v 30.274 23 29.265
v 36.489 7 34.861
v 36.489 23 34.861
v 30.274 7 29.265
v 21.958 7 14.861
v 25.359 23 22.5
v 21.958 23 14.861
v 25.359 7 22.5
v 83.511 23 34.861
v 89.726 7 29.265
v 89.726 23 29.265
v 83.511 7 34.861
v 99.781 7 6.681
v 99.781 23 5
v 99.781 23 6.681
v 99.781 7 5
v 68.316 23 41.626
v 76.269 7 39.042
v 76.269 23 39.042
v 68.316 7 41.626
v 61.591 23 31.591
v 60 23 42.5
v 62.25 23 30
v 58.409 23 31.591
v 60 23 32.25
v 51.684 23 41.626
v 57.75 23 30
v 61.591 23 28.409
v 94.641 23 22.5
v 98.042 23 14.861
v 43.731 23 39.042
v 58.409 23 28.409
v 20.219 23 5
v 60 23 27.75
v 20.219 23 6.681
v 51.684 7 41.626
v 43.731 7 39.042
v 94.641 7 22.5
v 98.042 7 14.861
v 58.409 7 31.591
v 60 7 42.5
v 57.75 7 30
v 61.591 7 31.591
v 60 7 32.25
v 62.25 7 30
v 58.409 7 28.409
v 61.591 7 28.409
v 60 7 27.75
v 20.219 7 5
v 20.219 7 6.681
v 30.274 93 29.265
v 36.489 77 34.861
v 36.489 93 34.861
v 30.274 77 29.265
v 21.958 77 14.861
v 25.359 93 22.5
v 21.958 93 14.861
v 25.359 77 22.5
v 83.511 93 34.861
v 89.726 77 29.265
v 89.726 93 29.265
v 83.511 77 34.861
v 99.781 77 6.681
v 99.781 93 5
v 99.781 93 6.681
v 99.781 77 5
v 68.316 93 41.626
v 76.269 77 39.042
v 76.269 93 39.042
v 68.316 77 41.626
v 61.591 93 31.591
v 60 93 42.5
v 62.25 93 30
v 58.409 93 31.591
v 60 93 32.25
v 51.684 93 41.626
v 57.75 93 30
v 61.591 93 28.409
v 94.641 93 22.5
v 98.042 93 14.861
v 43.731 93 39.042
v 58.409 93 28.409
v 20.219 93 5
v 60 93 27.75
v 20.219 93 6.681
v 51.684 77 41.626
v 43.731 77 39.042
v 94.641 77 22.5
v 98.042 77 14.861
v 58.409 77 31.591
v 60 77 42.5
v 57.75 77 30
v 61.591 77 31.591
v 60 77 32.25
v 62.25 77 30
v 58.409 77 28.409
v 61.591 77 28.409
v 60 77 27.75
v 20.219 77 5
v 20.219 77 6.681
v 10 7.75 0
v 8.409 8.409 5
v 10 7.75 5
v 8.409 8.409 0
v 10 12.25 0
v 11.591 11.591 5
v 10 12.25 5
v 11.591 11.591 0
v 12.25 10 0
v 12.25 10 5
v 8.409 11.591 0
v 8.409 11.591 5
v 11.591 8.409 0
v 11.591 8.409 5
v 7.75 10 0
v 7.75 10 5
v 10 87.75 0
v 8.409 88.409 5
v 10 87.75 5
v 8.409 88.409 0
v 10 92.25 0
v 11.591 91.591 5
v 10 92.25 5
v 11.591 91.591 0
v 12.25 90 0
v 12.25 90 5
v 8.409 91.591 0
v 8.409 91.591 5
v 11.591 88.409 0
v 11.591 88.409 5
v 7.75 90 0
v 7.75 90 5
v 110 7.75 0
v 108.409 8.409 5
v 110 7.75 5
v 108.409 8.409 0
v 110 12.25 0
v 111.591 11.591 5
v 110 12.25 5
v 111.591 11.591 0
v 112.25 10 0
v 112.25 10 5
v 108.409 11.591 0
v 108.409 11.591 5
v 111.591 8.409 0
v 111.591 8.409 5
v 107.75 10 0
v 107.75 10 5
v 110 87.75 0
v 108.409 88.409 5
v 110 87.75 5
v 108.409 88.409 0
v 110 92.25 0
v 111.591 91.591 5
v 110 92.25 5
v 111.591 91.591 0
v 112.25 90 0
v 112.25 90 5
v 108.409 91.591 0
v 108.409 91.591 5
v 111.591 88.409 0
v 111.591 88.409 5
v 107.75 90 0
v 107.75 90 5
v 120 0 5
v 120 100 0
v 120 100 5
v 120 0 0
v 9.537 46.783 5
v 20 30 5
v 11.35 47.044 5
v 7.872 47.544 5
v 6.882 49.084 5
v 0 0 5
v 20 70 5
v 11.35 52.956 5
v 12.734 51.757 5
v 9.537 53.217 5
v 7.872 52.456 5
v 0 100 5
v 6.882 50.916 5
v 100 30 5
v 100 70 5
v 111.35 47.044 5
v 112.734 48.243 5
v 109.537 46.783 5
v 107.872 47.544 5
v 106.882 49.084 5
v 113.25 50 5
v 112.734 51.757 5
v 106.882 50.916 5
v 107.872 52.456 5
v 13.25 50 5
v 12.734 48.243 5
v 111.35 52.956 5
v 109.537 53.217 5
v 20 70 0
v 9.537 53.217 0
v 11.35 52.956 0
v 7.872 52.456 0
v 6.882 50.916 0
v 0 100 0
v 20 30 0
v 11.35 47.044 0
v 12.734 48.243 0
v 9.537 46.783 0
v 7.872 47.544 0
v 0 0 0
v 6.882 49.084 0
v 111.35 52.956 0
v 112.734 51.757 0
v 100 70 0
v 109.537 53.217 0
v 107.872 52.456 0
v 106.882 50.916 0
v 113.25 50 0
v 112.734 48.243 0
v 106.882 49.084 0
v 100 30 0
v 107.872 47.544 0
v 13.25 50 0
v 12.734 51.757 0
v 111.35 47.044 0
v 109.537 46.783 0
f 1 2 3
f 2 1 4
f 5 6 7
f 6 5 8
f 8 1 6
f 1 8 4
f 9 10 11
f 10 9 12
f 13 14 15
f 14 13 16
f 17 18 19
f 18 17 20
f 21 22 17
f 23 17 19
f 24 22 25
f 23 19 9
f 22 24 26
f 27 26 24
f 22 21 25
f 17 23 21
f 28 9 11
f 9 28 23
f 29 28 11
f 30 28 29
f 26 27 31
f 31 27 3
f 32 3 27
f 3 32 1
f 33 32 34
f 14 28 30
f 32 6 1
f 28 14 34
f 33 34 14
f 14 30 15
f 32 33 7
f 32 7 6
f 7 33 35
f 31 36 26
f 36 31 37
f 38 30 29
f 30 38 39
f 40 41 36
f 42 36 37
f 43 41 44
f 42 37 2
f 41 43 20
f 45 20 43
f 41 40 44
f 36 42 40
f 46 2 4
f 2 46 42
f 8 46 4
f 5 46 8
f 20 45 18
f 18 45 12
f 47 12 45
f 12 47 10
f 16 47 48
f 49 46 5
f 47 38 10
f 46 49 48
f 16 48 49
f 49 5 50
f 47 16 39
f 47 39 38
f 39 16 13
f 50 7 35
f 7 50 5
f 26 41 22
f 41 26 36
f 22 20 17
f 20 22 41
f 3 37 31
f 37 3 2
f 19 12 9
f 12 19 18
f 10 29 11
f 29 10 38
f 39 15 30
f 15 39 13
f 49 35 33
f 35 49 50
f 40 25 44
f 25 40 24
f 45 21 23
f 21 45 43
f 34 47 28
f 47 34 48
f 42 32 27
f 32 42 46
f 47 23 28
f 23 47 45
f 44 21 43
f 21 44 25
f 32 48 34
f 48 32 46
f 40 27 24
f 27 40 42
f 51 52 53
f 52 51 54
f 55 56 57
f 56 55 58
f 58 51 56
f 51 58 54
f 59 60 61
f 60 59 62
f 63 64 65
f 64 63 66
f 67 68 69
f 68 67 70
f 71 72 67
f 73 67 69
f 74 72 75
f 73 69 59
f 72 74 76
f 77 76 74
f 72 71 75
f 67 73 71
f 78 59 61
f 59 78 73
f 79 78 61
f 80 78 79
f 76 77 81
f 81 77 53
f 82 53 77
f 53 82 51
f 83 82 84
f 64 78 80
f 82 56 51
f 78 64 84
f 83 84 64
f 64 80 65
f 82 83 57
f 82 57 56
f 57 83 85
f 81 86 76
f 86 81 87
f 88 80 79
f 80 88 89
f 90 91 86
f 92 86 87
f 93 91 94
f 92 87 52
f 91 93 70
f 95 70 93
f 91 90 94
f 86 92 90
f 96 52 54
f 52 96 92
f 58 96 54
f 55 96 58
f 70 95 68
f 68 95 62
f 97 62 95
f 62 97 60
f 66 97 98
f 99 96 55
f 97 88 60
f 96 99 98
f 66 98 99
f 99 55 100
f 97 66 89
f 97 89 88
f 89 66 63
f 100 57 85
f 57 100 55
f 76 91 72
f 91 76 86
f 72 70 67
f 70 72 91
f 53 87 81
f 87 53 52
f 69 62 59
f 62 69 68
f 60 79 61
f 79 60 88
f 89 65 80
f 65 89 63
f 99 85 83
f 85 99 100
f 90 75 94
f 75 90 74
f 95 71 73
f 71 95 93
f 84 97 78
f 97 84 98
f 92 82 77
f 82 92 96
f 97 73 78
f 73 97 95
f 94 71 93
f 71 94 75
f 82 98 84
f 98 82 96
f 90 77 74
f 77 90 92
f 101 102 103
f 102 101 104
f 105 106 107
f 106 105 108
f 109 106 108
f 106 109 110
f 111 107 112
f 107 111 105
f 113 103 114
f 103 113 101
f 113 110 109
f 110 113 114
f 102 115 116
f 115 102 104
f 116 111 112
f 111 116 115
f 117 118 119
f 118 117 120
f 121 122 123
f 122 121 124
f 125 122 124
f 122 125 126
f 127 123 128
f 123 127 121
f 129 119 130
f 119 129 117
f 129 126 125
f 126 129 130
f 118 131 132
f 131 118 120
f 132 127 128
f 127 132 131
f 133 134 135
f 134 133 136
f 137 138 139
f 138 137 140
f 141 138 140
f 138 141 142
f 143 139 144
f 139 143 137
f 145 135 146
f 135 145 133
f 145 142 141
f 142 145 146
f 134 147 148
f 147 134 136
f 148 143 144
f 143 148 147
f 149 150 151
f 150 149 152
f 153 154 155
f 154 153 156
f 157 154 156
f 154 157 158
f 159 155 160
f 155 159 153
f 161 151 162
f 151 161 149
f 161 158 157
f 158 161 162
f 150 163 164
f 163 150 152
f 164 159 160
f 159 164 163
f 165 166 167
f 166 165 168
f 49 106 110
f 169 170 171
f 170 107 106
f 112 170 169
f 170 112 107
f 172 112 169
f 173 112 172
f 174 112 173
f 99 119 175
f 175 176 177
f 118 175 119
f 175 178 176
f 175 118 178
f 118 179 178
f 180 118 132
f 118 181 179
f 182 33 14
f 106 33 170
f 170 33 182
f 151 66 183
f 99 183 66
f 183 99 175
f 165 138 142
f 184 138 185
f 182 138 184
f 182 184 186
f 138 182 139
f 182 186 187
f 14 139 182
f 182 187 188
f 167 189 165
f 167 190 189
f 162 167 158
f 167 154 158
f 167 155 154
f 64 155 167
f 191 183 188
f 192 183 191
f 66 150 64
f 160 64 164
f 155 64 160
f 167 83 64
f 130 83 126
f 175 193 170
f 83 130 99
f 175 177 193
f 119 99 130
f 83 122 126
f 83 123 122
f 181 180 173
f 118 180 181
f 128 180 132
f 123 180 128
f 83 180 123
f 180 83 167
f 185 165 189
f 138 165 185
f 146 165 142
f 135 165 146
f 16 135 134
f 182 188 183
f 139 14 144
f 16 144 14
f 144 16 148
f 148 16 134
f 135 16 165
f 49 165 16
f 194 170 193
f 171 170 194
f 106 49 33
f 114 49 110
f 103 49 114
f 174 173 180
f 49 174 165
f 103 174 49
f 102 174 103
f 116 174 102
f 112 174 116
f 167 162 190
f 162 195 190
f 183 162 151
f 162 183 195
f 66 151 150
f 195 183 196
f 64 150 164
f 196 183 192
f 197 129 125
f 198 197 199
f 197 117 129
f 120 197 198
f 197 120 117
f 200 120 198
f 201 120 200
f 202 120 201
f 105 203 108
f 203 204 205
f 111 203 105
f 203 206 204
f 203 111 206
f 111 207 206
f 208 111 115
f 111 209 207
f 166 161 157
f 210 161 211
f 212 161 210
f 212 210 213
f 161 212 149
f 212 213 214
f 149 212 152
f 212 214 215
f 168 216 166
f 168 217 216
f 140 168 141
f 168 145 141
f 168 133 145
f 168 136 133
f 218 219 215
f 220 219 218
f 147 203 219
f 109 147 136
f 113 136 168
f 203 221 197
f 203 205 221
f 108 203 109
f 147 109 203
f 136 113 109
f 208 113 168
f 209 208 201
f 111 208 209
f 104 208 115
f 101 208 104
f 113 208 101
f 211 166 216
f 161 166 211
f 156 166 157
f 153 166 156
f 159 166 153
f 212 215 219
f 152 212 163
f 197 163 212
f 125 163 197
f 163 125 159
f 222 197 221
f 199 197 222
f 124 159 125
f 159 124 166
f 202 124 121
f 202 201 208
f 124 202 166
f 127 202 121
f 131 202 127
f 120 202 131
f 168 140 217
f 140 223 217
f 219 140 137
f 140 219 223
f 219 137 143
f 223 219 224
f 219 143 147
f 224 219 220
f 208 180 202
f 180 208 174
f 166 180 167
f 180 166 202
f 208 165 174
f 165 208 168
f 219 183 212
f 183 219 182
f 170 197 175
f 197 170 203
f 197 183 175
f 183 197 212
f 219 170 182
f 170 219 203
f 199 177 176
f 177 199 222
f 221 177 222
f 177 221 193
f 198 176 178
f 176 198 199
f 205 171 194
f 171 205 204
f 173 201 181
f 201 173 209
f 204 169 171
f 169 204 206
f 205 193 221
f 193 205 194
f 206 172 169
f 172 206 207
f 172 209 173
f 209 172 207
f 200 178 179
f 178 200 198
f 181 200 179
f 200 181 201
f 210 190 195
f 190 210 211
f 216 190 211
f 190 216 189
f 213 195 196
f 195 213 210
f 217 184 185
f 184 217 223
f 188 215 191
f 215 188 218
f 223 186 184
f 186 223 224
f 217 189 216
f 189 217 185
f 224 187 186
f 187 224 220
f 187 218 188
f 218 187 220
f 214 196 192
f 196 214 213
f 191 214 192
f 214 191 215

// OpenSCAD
// prototype pedal 
plate_width = 120;
plate_length = 100;
plate_height = 5;

platehole_width = 80;
platehole_length = 40;
platehole_height = 17;

plate_dimensions = [plate_width,plate_length,plate_height];
hole_dimensions = [platehole_width, platehole_length, platehole_height];

drillhole_gap = 10;
drillhole_diameter = 4.5;
drillhole_spring_diameter = 6.5;
edge_gap = drillhole_gap + drillhole_diameter / 2; 

drillholedistance_x = plate_dimensions.x - 2*drillhole_gap;
drillholedistance_y = plate_dimensions.y - 2*drillhole_gap;
drillhole_x = [drillhole_gap : drillholedistance_x : plate_dimensions.x - drillhole_gap];
drillhole_y = [drillhole_gap : drillholedistance_y : plate_dimensions.y - drillhole_gap];

angle_placement = ((plate_length/2)-(platehole_length/2))/2;

//https://www.reddit.com/r/openscad/comments/loask5/half_sphere_cropping_how_do_i_cut_things/
module halfcylinder(he,rd) {
difference(){
cylinder (h=he,r=rd);
translate ([0,-rd-0.1,-0.1]) cube([rd+0.1,rd*2+0.2,he+0.2]);
} // df
}

// mod
cylinder_radius = plate_width / 3;
cylinder_height = 16;

//projection(){
difference(){
translate([plate_width/2, angle_placement+8, (plate_height/2)])
rotate([90,90,0])
halfcylinder(cylinder_height,cylinder_radius);

translate([plate_width/2,angle_placement+10,cylinder_radius-10])
    rotate([90,90,0])
	//color("black")
    cylinder(d = drillhole_diameter, h=cylinder_height + 8);
}

difference(){
translate([plate_width/2, plate_length-angle_placement+8,(plate_height/2)])
rotate([90,90,0])
halfcylinder(cylinder_height,cylinder_radius);
translate([plate_width/2, plate_length-angle_placement+10,cylinder_radius-10])
    rotate([90,90,0])
	//color("yellow")
    cylinder(d = drillhole_diameter, h=cylinder_height + 8);
}


difference(){
   
   cube(plate_dimensions);
   
   for(x = drillhole_x, y = drillhole_y)
   translate([x,y, -1])
   cylinder(d = drillhole_diameter, h = plate_dimensions.z +2);
   
   
    translate([
        (plate_width - platehole_width)/2,
    (plate_length - platehole_length)/2,
    -1])
   
    cube(hole_dimensions);  
   
   translate([(plate_width-platehole_width)/4,plate_length/2, -1])
   
   //color("black")
    cylinder(d = drillhole_spring_diameter, h=cylinder_height + 8);
   
   
   translate([plate_width-((plate_width-platehole_width)/4),plate_length/2, -1])
    cylinder(d = drillhole_spring_diameter, h=cylinder_height + 8);
   
   /*translate([1,-0,1])
   rotate([90,0,0])
   linear_extrude(5)
    text("nici - v1.0", size=2.5);*/

	//}


}
